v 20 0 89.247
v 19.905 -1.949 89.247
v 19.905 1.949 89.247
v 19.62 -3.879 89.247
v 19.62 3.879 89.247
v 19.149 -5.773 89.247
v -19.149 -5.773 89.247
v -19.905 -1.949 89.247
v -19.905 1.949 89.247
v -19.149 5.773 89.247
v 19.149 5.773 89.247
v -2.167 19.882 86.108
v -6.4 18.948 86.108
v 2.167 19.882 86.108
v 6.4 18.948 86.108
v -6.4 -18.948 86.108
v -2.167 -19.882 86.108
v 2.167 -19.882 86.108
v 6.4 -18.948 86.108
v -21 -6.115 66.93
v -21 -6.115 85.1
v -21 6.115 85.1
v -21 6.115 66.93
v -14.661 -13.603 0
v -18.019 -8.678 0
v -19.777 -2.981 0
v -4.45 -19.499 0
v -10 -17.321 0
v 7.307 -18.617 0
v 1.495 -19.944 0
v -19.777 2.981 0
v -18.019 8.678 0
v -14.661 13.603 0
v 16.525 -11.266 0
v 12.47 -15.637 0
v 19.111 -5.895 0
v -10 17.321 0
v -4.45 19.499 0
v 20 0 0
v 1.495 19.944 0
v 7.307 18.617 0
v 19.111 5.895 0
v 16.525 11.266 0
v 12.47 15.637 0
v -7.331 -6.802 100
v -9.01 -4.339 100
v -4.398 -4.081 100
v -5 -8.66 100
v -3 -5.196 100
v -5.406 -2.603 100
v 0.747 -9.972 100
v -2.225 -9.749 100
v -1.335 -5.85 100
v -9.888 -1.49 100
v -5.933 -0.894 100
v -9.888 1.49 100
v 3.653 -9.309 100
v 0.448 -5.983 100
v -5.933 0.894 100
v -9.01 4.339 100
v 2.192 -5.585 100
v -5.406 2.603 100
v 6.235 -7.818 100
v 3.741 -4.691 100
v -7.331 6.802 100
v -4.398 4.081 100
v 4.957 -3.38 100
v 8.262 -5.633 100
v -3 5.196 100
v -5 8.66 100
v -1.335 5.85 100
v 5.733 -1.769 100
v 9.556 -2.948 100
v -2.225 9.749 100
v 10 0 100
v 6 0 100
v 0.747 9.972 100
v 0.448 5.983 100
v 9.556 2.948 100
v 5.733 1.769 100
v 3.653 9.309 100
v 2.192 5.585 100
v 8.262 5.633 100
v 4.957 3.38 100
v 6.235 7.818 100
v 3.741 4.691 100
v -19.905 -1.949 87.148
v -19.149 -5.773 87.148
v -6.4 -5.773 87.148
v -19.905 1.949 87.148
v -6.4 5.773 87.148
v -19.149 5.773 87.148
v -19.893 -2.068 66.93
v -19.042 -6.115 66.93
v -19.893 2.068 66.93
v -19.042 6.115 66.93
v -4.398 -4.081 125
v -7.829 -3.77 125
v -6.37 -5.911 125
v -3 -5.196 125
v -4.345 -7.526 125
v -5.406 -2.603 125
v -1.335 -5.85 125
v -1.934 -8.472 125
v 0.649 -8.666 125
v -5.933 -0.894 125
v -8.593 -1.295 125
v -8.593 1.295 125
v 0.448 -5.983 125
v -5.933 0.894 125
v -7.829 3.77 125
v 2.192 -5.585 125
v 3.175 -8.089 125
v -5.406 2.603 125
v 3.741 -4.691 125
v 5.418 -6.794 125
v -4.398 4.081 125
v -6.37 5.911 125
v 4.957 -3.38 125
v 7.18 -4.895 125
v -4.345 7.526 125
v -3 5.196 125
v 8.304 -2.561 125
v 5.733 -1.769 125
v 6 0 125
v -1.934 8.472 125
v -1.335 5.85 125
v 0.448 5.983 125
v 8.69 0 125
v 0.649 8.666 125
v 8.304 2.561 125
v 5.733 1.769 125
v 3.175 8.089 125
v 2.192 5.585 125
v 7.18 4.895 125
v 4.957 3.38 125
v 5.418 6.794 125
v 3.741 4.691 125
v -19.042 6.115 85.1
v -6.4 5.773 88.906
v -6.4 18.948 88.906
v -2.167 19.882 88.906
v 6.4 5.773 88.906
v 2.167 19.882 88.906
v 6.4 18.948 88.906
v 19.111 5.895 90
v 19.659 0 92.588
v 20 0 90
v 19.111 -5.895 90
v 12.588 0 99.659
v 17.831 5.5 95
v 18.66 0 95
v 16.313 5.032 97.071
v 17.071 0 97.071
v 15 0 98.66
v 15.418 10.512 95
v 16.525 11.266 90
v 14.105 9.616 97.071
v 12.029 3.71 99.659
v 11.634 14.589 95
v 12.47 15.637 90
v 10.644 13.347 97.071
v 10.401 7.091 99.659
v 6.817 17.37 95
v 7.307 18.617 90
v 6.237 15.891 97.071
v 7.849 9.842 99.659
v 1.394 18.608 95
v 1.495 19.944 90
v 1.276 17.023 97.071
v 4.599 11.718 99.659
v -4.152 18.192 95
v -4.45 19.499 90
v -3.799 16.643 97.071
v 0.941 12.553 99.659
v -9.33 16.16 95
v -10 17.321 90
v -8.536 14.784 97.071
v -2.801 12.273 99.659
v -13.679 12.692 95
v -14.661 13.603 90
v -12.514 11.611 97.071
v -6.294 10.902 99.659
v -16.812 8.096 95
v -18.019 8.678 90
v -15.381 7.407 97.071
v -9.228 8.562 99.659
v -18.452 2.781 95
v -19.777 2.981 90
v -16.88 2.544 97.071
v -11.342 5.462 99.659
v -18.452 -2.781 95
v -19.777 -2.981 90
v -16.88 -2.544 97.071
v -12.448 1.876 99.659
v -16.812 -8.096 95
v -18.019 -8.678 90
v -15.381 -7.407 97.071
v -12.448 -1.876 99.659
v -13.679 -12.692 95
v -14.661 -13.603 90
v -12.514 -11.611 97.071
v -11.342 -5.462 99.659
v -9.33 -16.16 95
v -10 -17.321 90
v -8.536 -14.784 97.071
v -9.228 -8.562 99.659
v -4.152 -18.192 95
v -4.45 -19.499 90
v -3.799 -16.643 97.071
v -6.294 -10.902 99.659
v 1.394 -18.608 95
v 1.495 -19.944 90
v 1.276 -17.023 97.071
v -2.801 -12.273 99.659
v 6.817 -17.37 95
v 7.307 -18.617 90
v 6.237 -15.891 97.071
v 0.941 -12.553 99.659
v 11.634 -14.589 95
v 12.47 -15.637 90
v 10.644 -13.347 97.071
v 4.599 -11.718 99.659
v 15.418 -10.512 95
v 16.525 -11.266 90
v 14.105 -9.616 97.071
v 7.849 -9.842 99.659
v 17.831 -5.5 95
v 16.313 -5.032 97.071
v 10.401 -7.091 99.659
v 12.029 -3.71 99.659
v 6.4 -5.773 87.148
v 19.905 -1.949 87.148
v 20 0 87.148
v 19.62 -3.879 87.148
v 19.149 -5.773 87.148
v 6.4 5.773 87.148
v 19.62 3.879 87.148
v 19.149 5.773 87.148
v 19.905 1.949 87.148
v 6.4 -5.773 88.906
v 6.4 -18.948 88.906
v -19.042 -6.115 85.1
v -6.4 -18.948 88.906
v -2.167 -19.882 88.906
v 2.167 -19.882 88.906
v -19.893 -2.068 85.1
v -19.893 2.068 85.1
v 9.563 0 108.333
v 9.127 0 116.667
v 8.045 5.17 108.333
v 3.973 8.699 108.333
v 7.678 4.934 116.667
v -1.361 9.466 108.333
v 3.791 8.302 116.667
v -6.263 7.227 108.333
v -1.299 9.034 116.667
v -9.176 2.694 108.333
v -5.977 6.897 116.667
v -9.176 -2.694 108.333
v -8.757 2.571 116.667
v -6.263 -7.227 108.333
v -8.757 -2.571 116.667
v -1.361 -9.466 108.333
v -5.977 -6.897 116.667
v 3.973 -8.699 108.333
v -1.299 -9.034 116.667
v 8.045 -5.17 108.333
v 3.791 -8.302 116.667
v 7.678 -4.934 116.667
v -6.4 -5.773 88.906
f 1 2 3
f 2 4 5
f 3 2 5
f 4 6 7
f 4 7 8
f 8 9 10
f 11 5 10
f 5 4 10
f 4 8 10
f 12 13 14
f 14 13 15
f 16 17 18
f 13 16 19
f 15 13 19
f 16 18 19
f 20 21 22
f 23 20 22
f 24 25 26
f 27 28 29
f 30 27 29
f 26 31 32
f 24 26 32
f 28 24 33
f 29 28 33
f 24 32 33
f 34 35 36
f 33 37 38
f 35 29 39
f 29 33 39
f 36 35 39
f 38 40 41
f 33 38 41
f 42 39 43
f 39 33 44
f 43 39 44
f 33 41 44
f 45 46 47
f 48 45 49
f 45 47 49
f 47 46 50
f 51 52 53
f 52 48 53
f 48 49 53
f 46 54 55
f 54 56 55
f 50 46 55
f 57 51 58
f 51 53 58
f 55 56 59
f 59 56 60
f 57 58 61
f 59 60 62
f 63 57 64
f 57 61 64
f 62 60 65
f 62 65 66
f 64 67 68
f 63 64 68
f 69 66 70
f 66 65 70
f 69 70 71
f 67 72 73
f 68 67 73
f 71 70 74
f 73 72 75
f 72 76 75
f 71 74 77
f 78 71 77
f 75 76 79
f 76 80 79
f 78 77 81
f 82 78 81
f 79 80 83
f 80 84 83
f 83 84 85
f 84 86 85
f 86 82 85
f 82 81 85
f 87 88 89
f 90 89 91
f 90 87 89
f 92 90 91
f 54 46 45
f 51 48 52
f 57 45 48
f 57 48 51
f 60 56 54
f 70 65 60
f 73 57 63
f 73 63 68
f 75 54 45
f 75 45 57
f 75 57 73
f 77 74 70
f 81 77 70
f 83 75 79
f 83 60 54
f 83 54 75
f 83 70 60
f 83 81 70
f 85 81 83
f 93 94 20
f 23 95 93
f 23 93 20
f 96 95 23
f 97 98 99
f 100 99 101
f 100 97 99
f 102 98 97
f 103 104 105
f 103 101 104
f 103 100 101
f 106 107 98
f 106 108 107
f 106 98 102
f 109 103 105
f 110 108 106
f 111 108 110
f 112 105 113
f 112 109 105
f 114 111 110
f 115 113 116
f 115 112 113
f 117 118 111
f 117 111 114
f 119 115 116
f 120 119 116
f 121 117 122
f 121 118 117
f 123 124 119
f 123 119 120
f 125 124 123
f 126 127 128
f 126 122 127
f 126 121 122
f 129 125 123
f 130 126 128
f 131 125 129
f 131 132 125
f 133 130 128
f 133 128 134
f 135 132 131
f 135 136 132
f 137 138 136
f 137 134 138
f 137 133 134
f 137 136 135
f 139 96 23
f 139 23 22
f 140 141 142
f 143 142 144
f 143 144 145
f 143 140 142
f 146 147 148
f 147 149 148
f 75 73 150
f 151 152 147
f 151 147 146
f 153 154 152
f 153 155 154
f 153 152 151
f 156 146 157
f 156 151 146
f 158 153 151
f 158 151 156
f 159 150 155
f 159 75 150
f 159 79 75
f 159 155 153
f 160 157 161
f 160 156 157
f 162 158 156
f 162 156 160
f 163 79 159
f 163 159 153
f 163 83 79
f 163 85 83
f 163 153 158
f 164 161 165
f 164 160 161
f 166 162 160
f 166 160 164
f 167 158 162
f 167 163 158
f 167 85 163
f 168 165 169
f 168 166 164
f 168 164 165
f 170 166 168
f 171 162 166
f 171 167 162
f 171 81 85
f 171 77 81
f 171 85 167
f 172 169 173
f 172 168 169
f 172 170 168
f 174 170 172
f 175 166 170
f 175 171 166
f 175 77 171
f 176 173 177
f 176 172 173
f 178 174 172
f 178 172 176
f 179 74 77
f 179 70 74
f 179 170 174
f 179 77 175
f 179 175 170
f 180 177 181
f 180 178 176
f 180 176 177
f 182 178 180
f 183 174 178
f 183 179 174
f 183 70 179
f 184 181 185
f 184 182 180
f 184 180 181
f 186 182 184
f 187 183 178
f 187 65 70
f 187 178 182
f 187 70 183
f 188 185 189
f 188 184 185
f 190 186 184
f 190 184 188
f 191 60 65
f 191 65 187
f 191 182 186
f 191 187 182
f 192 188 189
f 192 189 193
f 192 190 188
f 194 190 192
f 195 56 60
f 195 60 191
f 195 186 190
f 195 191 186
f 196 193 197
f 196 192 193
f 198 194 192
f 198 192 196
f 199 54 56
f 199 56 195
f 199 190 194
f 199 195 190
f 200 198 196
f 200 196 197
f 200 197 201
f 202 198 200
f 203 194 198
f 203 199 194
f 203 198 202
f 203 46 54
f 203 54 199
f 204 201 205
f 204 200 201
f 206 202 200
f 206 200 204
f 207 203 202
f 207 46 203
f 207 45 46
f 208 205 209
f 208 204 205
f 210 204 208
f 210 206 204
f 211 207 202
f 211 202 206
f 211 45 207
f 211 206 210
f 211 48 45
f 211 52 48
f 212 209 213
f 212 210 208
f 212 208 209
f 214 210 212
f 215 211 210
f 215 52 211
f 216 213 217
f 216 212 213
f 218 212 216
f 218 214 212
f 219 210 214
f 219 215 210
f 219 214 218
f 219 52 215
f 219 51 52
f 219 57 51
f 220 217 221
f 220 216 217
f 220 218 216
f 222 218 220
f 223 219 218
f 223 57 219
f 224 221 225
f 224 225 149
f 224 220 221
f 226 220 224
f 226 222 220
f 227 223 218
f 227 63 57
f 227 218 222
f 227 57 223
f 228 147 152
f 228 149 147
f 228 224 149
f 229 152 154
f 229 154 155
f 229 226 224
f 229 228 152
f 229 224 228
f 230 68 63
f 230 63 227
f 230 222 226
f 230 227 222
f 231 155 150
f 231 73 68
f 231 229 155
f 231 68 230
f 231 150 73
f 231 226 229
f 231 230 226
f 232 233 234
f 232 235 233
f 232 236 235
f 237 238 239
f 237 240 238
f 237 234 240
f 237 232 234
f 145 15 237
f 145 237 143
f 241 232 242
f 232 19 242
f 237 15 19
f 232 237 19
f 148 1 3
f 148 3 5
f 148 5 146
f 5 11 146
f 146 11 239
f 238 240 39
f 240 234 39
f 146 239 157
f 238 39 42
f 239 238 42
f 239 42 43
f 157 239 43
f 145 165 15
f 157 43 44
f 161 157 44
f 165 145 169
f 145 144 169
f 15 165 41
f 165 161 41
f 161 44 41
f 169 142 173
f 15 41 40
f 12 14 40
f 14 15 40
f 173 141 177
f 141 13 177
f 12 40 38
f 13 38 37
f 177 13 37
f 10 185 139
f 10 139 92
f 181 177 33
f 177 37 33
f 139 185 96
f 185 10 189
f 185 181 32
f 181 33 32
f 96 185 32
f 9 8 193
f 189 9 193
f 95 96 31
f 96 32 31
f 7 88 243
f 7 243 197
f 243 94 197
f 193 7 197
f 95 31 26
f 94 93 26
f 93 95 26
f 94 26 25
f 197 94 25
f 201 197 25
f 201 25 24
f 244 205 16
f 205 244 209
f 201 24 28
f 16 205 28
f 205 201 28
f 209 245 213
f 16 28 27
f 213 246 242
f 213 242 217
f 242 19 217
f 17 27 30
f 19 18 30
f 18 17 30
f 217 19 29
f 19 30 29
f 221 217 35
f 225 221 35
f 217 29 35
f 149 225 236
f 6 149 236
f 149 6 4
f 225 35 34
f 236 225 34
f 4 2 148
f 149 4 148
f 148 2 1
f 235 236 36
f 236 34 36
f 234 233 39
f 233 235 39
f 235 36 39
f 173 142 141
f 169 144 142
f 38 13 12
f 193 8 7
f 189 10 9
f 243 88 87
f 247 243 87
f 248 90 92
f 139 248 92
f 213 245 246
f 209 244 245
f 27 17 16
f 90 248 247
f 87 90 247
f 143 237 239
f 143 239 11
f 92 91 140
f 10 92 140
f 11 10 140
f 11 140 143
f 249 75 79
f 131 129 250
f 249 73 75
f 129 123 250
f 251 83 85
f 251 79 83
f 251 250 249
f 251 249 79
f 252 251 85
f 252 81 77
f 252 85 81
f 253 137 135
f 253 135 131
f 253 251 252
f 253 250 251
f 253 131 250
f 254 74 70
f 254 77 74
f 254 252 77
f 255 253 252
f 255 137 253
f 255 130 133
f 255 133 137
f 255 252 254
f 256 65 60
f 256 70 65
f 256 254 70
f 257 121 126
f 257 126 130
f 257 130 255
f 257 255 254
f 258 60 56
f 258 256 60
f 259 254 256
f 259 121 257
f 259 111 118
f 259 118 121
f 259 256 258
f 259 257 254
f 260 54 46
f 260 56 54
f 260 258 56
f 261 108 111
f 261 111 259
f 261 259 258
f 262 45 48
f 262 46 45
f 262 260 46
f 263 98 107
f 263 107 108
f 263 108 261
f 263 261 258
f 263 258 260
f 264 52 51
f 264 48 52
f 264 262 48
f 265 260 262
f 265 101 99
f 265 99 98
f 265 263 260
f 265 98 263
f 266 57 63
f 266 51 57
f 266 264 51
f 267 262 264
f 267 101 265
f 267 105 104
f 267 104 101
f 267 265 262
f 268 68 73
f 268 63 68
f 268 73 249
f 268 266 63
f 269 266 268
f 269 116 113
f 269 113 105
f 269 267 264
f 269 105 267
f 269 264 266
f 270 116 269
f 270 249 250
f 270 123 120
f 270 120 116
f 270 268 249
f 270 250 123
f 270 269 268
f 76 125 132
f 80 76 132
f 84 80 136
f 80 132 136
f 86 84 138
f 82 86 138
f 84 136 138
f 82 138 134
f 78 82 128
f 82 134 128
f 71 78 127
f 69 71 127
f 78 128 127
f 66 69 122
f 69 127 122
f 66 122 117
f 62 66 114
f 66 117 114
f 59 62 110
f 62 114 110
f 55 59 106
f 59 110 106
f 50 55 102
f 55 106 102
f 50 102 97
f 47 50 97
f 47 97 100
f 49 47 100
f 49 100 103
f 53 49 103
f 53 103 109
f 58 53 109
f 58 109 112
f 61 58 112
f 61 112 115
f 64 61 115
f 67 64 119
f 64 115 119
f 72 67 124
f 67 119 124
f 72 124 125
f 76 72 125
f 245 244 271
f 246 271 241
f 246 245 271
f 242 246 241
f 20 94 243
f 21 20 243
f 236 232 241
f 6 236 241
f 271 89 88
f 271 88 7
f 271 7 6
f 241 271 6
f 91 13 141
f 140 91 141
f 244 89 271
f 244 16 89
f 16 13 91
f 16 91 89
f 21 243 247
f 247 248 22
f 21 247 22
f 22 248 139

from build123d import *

# Parameters (mm, degrees)
F0_R      = 20
F1_DEPTH  = 100
F2_R      = 10
F3_DEPTH  = 25
F3_TAPER  = 3
F4_R      = 10
F5_R      = 6
F6_DEPTH  = 25
F8_W      = 12.2296223417
F8_H      = 18.1697160006
F9_DEPTH  = 3
F11_W     = 12.8006860614
F11_H     = 2.7982592583
F12_DEPTH = 50
F14_W     = 11.5454401821
F14_H     = 2.0991712809
F15_DEPTH = 50


with BuildPart() as f1:
    # F0 (on Top) → F1 (new body)
    with BuildSketch(Plane.XY):
        Circle(F0_R)
    extrude(amount=F1_DEPTH)

    # F4
    f4_edges = [f1.edges().sort_by_distance(p)[0] for p in [
        (-20, 0, 100),
    ]]
    fillet(f4_edges, radius=F4_R)

    # F8 (on offset) → F9 (join)
    with BuildSketch(Plane.YZ.offset(-18)):
        with Locations((0, 76.0149732232)):
            Rectangle(F8_W, F8_H)
    extrude(amount=-F9_DEPTH)

    # F11 (on offset) → F12 (cut)
    with BuildSketch(Plane.XZ.offset(21)):
        with Locations((0, 87.5067338347)):
            Rectangle(F11_W, F11_H)
    extrude(amount=-F12_DEPTH, mode=Mode.SUBTRACT)

    # F14 (on offset) → F15 (cut)
    with BuildSketch(Plane.YZ.offset(-21)):
        with Locations((0, 88.1978794932)):
            Rectangle(F14_W, F14_H)
    extrude(amount=F15_DEPTH, mode=Mode.SUBTRACT)


with BuildPart() as f3:
    # F2 (on face) → F3 (new body)
    with BuildSketch(Plane.XY.offset(100)):
        Circle(F2_R)
    extrude(amount=F3_DEPTH, taper=F3_TAPER)

    # F5 (on face) → F6 (cut)
    with BuildSketch(Plane.XY.offset(125)):
        Circle(F5_R)
    extrude(amount=-F6_DEPTH, mode=Mode.SUBTRACT)


solid = Compound([f1.part, f3.part])
